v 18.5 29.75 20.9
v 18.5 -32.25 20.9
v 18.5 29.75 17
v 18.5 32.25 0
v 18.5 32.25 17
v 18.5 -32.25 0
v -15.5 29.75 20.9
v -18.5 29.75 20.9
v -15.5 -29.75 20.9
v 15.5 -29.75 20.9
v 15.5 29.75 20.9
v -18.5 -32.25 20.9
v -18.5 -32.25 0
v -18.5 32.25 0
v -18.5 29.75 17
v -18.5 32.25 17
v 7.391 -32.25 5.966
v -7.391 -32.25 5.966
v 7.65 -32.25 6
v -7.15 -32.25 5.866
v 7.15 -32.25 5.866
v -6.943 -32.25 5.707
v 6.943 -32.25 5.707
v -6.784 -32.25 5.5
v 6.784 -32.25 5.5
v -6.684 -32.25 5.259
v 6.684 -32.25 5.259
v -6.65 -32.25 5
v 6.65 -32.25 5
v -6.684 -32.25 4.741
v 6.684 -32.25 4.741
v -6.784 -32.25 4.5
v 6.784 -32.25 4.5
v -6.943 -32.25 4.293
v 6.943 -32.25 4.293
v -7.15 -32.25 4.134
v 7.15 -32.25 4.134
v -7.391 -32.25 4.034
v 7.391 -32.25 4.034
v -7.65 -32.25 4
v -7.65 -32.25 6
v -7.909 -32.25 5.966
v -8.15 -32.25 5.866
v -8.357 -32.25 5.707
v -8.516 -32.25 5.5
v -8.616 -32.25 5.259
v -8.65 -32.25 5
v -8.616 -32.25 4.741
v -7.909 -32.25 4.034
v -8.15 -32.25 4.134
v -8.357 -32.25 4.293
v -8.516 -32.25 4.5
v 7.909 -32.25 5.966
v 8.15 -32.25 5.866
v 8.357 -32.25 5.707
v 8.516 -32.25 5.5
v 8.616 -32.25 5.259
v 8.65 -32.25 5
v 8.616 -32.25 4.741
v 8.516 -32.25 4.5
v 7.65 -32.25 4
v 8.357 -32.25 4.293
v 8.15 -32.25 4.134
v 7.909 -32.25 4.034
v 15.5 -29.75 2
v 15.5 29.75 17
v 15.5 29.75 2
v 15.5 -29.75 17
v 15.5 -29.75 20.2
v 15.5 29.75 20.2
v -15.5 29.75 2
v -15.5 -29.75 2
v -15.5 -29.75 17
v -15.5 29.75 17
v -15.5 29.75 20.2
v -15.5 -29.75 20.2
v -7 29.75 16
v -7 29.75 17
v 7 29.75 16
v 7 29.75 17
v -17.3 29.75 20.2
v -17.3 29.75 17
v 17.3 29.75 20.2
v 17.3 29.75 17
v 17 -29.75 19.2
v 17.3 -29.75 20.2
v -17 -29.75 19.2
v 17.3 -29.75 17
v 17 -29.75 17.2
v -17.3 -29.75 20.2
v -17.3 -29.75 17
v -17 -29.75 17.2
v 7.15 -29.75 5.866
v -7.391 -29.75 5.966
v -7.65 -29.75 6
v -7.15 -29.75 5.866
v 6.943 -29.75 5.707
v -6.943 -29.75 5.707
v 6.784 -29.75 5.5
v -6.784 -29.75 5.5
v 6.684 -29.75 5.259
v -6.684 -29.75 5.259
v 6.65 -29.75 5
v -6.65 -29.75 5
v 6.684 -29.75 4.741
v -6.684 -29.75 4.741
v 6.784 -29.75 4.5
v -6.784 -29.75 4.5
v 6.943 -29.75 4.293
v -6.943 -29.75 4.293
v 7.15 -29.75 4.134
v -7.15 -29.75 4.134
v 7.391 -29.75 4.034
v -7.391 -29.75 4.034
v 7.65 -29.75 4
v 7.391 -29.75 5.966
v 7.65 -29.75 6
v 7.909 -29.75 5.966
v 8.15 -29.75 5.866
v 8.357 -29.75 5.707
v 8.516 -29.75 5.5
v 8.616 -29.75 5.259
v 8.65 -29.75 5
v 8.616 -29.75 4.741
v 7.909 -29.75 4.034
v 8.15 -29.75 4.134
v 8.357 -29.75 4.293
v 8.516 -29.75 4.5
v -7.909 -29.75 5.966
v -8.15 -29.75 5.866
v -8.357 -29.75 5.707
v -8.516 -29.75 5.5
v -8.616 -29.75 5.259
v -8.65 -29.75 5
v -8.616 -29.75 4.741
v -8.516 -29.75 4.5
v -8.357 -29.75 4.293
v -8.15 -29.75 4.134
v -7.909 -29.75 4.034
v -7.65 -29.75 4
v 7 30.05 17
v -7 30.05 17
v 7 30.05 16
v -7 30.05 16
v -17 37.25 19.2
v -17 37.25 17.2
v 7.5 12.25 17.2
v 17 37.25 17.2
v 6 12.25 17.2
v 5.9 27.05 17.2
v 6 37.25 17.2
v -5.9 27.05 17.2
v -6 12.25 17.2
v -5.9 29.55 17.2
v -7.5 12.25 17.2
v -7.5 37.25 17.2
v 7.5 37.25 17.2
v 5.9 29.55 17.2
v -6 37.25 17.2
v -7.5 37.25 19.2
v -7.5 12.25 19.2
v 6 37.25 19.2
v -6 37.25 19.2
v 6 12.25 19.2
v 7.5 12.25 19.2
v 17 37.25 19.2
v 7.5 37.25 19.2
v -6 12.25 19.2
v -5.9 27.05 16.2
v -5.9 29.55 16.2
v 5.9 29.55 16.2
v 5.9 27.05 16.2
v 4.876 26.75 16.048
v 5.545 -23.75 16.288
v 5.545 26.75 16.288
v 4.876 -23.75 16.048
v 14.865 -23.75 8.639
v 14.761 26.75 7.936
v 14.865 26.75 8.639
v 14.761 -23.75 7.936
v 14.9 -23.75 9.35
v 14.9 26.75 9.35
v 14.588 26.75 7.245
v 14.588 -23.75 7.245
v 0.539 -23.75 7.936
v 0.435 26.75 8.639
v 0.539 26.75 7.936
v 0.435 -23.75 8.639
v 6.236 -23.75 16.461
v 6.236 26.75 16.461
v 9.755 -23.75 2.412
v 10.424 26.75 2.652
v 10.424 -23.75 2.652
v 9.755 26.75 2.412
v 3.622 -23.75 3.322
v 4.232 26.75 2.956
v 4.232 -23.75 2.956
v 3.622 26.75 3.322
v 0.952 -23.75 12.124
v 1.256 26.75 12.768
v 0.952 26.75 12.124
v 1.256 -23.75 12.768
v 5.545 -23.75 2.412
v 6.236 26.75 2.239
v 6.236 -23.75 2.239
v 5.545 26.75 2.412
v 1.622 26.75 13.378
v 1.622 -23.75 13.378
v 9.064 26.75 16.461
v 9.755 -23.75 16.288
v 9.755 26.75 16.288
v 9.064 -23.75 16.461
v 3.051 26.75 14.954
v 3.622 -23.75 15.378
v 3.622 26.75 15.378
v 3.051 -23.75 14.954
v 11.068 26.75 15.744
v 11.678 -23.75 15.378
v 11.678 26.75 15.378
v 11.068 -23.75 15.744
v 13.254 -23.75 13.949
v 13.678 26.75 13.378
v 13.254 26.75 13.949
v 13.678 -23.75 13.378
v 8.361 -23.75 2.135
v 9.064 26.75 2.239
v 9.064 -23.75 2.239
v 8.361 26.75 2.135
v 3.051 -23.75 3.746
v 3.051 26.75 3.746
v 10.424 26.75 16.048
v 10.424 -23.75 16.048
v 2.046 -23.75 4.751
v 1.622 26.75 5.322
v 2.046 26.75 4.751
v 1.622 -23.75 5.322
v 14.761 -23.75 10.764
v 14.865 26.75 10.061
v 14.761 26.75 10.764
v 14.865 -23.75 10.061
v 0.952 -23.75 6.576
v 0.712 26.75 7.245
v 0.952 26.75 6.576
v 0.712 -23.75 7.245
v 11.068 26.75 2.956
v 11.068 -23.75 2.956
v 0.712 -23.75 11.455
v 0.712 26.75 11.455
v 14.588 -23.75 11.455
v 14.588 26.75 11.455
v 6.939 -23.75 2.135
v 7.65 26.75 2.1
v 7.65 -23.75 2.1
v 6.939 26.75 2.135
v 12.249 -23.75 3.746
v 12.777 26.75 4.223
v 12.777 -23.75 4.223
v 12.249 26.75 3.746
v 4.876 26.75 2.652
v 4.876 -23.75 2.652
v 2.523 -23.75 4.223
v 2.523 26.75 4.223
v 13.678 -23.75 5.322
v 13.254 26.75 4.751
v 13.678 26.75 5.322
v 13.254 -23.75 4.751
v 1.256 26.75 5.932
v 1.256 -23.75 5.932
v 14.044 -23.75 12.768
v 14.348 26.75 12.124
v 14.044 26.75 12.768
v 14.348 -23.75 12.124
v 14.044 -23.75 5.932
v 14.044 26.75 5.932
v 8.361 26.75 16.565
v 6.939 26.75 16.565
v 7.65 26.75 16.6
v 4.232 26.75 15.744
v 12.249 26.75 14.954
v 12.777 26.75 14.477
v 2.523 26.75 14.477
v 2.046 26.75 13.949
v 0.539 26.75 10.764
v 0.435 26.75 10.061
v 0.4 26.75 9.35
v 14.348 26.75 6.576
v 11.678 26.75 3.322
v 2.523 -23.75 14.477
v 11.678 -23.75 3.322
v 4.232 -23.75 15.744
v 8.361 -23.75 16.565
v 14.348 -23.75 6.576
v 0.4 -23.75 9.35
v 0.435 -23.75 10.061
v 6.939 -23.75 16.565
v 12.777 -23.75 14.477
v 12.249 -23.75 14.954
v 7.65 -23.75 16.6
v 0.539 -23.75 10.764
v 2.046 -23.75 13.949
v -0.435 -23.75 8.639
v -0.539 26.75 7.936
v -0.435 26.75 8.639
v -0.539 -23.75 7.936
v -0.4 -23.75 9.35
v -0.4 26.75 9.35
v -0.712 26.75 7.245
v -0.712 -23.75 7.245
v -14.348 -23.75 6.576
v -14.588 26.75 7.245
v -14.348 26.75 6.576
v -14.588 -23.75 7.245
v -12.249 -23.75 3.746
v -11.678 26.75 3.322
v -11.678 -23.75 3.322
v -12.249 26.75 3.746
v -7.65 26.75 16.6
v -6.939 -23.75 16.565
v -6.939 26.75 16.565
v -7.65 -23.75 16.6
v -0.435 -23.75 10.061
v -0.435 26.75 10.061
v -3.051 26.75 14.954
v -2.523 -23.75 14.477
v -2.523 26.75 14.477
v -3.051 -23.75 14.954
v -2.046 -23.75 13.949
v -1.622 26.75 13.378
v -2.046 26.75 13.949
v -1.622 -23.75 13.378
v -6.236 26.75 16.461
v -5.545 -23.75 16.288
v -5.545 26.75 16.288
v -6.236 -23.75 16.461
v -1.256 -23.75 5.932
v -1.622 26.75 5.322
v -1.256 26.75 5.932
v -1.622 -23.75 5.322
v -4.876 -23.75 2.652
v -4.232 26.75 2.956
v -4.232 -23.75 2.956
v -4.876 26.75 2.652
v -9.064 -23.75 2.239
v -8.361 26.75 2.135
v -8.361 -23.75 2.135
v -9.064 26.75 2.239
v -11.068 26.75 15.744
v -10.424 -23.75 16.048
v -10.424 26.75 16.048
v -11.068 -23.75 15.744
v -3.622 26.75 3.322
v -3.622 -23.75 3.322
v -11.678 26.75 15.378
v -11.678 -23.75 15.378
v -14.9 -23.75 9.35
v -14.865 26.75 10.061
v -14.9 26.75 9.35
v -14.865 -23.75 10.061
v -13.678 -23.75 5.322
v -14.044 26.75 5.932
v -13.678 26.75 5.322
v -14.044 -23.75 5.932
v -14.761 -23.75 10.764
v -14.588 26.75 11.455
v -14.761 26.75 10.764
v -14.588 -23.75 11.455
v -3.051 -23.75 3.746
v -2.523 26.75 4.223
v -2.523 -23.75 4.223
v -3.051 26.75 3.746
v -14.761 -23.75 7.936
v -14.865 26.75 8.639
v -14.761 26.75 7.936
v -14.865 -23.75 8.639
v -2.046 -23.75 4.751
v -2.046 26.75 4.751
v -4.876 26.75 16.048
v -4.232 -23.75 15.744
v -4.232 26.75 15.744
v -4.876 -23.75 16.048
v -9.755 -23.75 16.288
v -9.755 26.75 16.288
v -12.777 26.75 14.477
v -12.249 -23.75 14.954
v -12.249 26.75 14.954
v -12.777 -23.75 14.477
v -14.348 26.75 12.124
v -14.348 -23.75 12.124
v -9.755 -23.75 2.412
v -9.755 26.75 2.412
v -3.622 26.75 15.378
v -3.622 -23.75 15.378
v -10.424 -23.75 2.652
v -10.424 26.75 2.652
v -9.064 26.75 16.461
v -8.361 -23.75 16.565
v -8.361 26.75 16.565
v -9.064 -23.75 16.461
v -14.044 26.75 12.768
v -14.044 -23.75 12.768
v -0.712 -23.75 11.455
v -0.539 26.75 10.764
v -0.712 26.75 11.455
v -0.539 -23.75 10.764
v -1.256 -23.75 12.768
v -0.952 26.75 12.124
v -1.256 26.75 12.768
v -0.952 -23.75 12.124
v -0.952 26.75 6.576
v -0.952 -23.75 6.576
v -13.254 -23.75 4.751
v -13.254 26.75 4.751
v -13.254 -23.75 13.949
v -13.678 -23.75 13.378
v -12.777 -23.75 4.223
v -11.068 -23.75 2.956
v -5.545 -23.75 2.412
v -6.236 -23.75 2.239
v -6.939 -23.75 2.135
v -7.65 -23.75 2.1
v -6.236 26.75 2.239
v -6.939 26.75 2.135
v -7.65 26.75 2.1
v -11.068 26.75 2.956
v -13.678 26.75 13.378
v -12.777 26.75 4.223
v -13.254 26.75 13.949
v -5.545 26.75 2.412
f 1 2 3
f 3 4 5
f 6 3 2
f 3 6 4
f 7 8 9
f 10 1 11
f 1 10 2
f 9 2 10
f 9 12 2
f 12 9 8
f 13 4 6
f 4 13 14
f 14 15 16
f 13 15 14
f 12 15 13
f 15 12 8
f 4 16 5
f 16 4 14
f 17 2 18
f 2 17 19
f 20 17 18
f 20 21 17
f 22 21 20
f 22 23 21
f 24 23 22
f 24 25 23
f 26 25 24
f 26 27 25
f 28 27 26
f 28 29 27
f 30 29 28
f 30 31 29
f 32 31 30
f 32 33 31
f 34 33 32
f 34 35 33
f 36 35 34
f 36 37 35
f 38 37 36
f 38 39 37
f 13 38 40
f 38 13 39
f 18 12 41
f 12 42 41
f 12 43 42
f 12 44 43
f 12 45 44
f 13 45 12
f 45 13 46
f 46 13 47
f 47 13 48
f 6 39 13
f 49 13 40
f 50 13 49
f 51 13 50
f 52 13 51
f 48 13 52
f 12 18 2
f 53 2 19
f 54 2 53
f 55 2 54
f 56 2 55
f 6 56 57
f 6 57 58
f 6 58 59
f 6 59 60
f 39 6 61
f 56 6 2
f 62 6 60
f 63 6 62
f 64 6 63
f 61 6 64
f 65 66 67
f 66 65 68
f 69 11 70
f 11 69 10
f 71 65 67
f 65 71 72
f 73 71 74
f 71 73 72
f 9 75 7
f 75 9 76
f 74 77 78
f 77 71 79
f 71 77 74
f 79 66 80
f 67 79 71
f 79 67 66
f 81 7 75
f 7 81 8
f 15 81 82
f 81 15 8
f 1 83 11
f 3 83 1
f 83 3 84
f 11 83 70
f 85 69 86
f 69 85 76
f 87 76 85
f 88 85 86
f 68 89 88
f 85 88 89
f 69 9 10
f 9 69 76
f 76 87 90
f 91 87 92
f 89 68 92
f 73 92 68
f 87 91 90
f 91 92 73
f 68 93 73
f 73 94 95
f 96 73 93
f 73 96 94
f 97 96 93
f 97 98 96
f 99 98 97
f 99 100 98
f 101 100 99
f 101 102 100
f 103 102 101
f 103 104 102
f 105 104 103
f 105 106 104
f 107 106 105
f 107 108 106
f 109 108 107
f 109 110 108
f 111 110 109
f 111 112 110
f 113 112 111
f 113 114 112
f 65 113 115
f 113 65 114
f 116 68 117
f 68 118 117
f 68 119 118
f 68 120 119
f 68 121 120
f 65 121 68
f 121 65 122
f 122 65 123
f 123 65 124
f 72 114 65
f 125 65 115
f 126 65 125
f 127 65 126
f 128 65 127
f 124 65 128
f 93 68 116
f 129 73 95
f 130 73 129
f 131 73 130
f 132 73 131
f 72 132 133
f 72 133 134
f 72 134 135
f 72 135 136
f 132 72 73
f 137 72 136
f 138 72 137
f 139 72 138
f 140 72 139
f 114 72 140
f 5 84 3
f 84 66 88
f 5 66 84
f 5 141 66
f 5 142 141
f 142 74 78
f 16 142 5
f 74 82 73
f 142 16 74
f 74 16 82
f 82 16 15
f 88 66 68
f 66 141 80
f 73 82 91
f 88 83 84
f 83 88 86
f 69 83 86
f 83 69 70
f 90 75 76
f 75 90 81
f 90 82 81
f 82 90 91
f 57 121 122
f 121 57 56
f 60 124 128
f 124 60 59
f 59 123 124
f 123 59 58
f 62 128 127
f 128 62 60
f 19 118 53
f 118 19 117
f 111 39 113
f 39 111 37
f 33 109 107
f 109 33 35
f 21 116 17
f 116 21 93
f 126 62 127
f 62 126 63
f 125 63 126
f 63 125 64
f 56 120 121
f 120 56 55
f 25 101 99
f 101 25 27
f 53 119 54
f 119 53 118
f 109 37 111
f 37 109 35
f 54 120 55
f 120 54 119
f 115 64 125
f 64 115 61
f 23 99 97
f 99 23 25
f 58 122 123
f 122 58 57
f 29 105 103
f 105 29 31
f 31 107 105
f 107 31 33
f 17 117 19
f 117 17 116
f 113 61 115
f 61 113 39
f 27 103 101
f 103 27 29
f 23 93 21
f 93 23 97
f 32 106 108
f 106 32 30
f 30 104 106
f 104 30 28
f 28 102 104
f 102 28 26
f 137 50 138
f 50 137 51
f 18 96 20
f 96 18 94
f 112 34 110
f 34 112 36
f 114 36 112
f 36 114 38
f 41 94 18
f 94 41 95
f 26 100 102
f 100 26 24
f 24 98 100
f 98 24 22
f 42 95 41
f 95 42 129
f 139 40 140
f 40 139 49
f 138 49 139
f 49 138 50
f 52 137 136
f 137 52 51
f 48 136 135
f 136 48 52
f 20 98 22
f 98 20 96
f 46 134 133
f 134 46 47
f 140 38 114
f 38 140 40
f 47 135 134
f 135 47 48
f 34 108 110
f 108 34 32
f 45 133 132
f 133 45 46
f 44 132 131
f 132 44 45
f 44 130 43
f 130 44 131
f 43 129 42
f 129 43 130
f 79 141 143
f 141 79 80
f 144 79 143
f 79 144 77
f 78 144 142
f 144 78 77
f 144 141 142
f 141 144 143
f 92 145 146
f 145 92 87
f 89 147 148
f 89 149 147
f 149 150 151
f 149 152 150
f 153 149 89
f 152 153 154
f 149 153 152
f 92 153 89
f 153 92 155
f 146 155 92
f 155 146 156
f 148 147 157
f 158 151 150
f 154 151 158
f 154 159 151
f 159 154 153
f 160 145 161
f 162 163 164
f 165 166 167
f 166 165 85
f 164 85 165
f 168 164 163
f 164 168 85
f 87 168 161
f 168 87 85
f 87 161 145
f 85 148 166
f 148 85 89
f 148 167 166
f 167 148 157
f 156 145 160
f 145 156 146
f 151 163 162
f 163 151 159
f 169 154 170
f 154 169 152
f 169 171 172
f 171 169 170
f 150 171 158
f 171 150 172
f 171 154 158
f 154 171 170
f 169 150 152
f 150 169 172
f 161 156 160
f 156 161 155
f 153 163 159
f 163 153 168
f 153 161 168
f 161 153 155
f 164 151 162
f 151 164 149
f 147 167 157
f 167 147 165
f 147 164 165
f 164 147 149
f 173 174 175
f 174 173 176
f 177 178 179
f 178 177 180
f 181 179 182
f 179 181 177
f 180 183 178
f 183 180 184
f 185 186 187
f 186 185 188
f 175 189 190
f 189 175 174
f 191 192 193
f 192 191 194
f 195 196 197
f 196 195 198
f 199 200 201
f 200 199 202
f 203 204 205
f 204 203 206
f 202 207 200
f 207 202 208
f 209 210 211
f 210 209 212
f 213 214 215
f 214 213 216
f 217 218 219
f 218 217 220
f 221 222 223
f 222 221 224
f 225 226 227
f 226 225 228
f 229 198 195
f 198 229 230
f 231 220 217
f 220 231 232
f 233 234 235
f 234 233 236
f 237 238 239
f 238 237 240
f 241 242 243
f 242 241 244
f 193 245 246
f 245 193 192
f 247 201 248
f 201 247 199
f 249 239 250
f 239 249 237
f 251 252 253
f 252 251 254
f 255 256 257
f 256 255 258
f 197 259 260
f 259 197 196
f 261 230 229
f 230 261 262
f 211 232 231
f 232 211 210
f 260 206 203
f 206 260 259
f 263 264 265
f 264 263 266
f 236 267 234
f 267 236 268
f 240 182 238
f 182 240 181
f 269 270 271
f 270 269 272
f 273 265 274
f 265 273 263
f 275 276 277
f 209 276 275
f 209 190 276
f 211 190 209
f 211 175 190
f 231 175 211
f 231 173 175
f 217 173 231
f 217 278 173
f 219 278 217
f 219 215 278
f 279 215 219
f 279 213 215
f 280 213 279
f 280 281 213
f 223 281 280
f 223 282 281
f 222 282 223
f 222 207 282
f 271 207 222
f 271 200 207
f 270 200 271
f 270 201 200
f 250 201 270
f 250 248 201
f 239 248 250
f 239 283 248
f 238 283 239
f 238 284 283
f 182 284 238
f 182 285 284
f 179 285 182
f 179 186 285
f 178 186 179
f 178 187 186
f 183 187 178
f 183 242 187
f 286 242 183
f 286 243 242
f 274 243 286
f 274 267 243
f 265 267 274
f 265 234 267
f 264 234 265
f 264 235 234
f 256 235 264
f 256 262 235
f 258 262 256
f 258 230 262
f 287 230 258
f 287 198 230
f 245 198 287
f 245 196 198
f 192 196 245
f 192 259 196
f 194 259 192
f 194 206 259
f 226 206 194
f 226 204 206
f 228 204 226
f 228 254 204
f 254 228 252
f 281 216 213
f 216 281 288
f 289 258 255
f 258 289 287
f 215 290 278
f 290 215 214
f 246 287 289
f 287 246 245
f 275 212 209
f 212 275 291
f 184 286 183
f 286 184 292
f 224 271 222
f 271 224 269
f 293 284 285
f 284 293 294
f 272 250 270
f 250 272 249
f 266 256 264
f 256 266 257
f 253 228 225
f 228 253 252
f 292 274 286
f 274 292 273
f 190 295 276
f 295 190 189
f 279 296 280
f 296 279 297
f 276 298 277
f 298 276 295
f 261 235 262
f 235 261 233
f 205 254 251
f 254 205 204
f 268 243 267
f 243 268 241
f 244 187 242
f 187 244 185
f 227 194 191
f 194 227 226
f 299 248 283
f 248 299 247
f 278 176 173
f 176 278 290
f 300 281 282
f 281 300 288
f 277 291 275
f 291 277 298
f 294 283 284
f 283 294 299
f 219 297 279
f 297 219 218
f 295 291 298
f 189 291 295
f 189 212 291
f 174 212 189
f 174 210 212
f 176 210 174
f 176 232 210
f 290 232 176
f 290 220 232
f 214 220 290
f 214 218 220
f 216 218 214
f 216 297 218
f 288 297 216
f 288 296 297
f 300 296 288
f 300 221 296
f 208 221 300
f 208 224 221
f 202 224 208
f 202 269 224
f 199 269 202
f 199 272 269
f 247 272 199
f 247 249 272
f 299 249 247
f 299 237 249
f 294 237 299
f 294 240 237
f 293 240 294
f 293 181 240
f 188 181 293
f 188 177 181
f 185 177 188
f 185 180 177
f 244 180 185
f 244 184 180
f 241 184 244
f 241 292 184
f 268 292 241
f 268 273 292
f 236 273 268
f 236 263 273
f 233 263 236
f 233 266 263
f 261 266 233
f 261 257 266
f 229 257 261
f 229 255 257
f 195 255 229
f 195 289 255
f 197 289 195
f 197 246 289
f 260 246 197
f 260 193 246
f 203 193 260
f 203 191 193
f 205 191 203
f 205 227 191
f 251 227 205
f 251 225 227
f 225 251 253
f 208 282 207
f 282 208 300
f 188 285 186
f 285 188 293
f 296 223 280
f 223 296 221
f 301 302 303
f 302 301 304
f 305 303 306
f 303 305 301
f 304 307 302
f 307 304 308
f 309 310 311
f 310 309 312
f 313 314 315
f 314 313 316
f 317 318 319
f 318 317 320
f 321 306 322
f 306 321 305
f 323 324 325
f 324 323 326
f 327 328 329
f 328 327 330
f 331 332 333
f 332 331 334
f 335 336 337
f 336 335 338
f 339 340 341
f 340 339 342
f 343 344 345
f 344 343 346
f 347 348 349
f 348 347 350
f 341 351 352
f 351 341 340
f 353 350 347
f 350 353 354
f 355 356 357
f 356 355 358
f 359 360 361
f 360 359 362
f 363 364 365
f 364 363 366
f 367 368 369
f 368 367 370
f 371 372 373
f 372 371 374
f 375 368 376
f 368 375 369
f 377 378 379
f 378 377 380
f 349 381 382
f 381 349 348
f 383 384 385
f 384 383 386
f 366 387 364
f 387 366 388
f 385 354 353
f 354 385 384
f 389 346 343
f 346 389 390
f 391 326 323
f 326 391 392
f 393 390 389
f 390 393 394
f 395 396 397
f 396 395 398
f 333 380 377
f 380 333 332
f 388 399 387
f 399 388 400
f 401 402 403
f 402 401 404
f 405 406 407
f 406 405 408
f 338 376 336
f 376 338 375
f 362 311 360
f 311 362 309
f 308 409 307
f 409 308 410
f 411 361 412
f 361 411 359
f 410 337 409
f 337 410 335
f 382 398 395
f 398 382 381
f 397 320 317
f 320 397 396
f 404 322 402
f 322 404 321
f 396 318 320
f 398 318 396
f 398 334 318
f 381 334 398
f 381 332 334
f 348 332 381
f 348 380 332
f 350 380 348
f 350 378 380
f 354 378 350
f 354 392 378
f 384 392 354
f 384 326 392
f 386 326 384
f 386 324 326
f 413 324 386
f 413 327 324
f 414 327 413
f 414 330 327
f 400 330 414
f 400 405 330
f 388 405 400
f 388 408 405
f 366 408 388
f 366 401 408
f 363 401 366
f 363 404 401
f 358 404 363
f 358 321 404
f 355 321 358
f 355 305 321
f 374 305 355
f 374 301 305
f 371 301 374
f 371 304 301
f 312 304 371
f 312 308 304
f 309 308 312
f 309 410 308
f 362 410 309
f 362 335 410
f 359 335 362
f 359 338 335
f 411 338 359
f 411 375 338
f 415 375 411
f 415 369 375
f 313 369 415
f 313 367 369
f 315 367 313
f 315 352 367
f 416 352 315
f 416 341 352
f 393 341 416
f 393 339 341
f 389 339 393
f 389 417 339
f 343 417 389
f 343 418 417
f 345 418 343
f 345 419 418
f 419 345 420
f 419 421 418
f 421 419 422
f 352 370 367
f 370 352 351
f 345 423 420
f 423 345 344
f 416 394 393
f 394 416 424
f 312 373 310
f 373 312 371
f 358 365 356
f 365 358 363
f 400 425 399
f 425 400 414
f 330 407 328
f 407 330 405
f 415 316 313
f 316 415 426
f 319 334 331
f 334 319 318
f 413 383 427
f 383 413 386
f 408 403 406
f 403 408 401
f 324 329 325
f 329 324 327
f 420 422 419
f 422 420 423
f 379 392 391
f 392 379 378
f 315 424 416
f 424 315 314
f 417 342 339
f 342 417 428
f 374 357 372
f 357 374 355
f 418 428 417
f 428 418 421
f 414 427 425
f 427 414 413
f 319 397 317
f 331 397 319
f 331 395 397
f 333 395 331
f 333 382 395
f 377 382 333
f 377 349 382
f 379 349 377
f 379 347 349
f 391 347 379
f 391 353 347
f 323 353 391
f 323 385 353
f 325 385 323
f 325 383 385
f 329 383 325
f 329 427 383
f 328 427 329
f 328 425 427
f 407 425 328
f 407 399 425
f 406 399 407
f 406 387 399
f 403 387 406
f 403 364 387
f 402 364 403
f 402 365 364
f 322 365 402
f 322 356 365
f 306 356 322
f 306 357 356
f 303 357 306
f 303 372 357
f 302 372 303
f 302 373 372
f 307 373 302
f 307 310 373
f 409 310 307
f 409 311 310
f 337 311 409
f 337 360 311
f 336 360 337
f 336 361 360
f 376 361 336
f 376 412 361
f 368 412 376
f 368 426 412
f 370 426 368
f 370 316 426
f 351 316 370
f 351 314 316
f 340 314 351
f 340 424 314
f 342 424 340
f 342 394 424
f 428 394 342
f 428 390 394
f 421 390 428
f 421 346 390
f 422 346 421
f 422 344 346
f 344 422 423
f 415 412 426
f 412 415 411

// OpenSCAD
/* Holder for two AA batteries with sliding cover.
   PLA, 0.4mm nozzle, no supports. Units mm.
   Print orientation: +Z up, parts rest on min z.
*/

// ---------- parameters ----------
battery_d = 14.5;
battery_l = 50.5;
side_gap = 0.6;      // battery side to wall
mid_gap = 0.8;       // between batteries
Wi = 2*battery_d + mid_gap + 2*side_gap; // 31.0 interior width
Li = battery_l + 3 + 6;                  // 59.5 interior length
floor_t = 2.0;
side_t = 3.0;
end_t = 2.5;
Wext = Wi + 2*side_t;   // 37
Lext = Li + 2*end_t;    // 64.5
wall_top = 20.9;
low_top = 17.0;
groove_bottom = 17.0;
groove_h = 3.2;
groove_top = groove_bottom + groove_h; // 20.2
groove_depth = 1.8;
engage = 1.5;
Wc = Wi + 2*engage;     // 34 cover width
Lc0 = Lext/2 + Li/2;      // 62 main length (leading edge butts on spring wall)
lip_len = 5.0;
Lc = Lc0 + lip_len;     // 67 total cover length
y0b = -Lext/2;          // -32.25 base min y
y1b = Lext/2;           // 32.25 base max y
y0c = -Li/2;            // -29.75 cover min y (stops at spring wall inner face)
y1c = Lext/2 + lip_len; // 37.25 cover max y
tc = 2.0;
finger_w = 12;
slot_w = 1.5;
finger_y0 = 12.25;
tooth_w = 11.8;
tooth_yl = 2.5;
tooth_y0 = 27.05;
tooth_y1 = tooth_y0 + tooth_yl; // 29.55: drops past low-wall inner face in closed pose
tooth_h = 1.0;
notch_hw = 7;
notch_y0 = 29.25;
notch_y1 = 30.05;
notch_bot = 16.0;
bx = battery_d/2 + mid_gap/2; // 7.65 battery center x
battery_y0 = -Li/2 + 6;       // -23.75 spring side
battery_y1 = battery_y0 + battery_l; // 26.75
battery_yc = (battery_y0 + battery_y1)/2; // 1.5
battery_zc = floor_t + battery_d/2 + 0.1; // 9.35 slight lift
wire_z = 5;
wire_r = 1.0;

part = "assembly"; // [base, cover, assembly]
cadverify_only = "";
module instance(name, part, unit = 1) {
    echo(cadverify_instance = [name, part, unit]);
    if (cadverify_only == "" || cadverify_only == name) children();
}

module battery() {
    rotate([-90,0,0])
        cylinder(d=battery_d, h=battery_l, center=true, $fn=64);
}

module base() {
    difference() {
        // outer solid
        translate([-Wext/2, y0b, 0])
            cube([Wext, Lext, wall_top]);
        // interior cavity open at top
        translate([-Wi/2, -Li/2, floor_t])
            cube([Wi, Li, wall_top - floor_t + 1]);
        // low end wall cut (+Y end)
        translate([-Wext/2, Li/2, low_top])
            cube([Wext, Lext/2 - Li/2 + 0.5, wall_top - low_top + 1]);
        // left groove
        translate([Wi/2, -Li/2, groove_bottom])
            cube([groove_depth, Li/2 + Lext/2 + 0.5, groove_h]);
        // right groove
        translate([-Wi/2 - groove_depth, -Li/2, groove_bottom])
            cube([groove_depth, Li/2 + Lext/2 + 0.5, groove_h]);
        // wire holes through spring (-Y) wall
        translate([bx, y0b - 1, wire_z])
            rotate([-90,0,0])
                cylinder(r=wire_r, h=end_t + 2, $fn=24);
        translate([-bx, y0b - 1, wire_z])
            rotate([-90,0,0])
                cylinder(r=wire_r, h=end_t + 2, $fn=24);
        // latch notch in low wall top
        translate([-notch_hw, notch_y0, notch_bot])
            cube([2*notch_hw, notch_y1 - notch_y0, low_top - notch_bot + 0.02]);
    }
}

module cover() {
    // print orientation: plate 0..tc, tooth on top tc..tc+tooth_h
    difference() {
        union() {
            translate([-Wc/2, y0c, 0])
                cube([Wc, Lc, tc]);
            // latch tooth on top (becomes bottom after flip)
            translate([-tooth_w/2, tooth_y0, tc])
                cube([tooth_w, tooth_yl, tooth_h]);
        }
        // finger slots, open at +Y lip end
        translate([finger_w/2, finger_y0, -0.5])
            cube([slot_w, y1c - finger_y0 + 0.5, tc + 1.5]);
        translate([-finger_w/2 - slot_w, finger_y0, -0.5])
            cube([slot_w, y1c - finger_y0 + 0.5, tc + 1.5]);
    }
}

module assembly() {
    instance("base", "base", 1) base();
    instance("battery_left", "external", 1)
        translate([bx, battery_yc, battery_zc]) battery();
    instance("battery_right", "external", 1)
        translate([-bx, battery_yc, battery_zc]) battery();
    // cover printed upside-down: rotate 180 about Y then lift
    instance("cover", "cover", 1)
        translate([0, 0, 19.2]) rotate([0,180,0]) cover();
}

// ---------- specs ----------
if (part == "base") {
    echo(cadverify_spec = [
        ["bounds", [[-Wext/2, y0b, 0], [Wext/2, y1b, wall_top]]],
        ["bodies", 1],
        ["through_holes", 2],
        ["support_faces", [["bottom", "-z", 2000]]],
        ["overhangs_allowed", [
            ["groove ceilings bridge 3.6mm", [[Wi/2 - 0.6, -Li/2 - 0.5, groove_bottom - 0.5], [Wi/2 + groove_depth + 0.5, y1b + 0.2, groove_top + 0.6]]],
            ["groove ceilings bridge 3.6mm", [[-Wi/2 - groove_depth - 0.5, -Li/2 - 0.5, groove_bottom - 0.5], [-Wi/2 + 0.6, y1b + 0.2, groove_top + 0.6]]],
            ["wire holes 2mm dia bridges", [[-10, y0b - 0.5, wire_z - 1.5], [10, -Li/2 + 0.5, wire_z + 1.5]]]
        ]],
        ["copies", 1],
        ["details", [
            ["cavity", "void", [[-Wi/2, -Li/2, floor_t], [Wi/2, Li/2, 17]], 0.9],
            ["spring_room", "void", [[-Wi/2, -Li/2, floor_t], [Wi/2, -Li/2 + 6, 16.6]], 0.9],
            ["pos_room", "void", [[-Wi/2, Li/2 - 3, floor_t], [Wi/2, Li/2, 16.6]], 0.9],
            ["groove_left", "void", [[Wi/2, -Li/2, groove_bottom], [Wi/2 + groove_depth, y1b, groove_top]], 0.85],
            ["groove_right", "void", [[-Wi/2 - groove_depth, -Li/2, groove_bottom], [-Wi/2, y1b, groove_top]], 0.85],
            ["notch", "void", [[-notch_hw, notch_y0, notch_bot], [notch_hw, notch_y1, low_top + 0.02]], 0.85],
            ["wire1", "hole", [bx, y0b - 1, wire_z], [0, 1, 0], [[0, 2], [2, 2]]],
            ["wire2", "hole", [-bx, y0b - 1, wire_z], [0, 1, 0], [[0, 2], [2, 2]]],
            ["floor", "thickness", [0, 0, -1], [0, 0, 1], 2.0],
            ["side_wall", "thickness", [Wext/2 + 1, 0, 18.2], [-1, 0, 0], 1.2],
            ["end_wall", "thickness", [0, y1b + 1, 10], [0, -1, 0], 2.5]
        ]]
    ]);
    base();
} else if (part == "cover") {
    echo(cadverify_spec = [
        ["bounds", [[-Wc/2, y0c, 0], [Wc/2, y1c, tc + tooth_h]]],
        ["bodies", 1],
        ["through_holes", 0],
        ["support_faces", [["bottom", "-z", 1500]]],
        ["overhangs_allowed", []],
        ["copies", 1],
        ["details", [
            ["plate", "thickness", [0, -10, -1], [0, 0, 1], 2.0],
            ["finger", "material", [[-finger_w/2, finger_y0, 0], [finger_w/2, y1c, tc]], 0.85],
            ["slot_left", "void", [[finger_w/2, finger_y0, -0.5], [finger_w/2 + slot_w, y1c + 0.01, tc + 0.5]], 0.85],
            ["slot_right", "void", [[-finger_w/2 - slot_w, finger_y0, -0.5], [-finger_w/2, y1c + 0.01, tc + 0.5]], 0.85],
            ["tooth", "material", [[-tooth_w/2, tooth_y0, tc], [tooth_w/2, tooth_y1, tc + tooth_h]], 0.85],
            ["lip", "material", [[-Wc/2, y1b, 0], [Wc/2, y1c, tc]], 0.9]
        ]]
    ]);
    cover();
} else if (part == "assembly") {
    echo(cadverify_spec = [
        ["bounds", [[-Wext/2, y0b, 0], [Wext/2, y1c, wall_top]]],
        ["support_faces", [["bottom", "-z", 2000]]],
        ["allowed_interferences", []],
        ["motions", [
            ["slide_cover", ["cover"], "slide", [0, 1, 0], [0, 60], ["flex", [["cover", "base", 1.0, "latch tooth rides over end wall"]]]]
        ]],
        ["assembly_order", [
            [["base"], [0, 0, 0]],
            [["battery_left"], [0, 0, -1]],
            [["battery_right"], [0, 0, -1]],
            [["cover"], [0, -1, 0]]
        ]]
    ]);
    assembly();
}
